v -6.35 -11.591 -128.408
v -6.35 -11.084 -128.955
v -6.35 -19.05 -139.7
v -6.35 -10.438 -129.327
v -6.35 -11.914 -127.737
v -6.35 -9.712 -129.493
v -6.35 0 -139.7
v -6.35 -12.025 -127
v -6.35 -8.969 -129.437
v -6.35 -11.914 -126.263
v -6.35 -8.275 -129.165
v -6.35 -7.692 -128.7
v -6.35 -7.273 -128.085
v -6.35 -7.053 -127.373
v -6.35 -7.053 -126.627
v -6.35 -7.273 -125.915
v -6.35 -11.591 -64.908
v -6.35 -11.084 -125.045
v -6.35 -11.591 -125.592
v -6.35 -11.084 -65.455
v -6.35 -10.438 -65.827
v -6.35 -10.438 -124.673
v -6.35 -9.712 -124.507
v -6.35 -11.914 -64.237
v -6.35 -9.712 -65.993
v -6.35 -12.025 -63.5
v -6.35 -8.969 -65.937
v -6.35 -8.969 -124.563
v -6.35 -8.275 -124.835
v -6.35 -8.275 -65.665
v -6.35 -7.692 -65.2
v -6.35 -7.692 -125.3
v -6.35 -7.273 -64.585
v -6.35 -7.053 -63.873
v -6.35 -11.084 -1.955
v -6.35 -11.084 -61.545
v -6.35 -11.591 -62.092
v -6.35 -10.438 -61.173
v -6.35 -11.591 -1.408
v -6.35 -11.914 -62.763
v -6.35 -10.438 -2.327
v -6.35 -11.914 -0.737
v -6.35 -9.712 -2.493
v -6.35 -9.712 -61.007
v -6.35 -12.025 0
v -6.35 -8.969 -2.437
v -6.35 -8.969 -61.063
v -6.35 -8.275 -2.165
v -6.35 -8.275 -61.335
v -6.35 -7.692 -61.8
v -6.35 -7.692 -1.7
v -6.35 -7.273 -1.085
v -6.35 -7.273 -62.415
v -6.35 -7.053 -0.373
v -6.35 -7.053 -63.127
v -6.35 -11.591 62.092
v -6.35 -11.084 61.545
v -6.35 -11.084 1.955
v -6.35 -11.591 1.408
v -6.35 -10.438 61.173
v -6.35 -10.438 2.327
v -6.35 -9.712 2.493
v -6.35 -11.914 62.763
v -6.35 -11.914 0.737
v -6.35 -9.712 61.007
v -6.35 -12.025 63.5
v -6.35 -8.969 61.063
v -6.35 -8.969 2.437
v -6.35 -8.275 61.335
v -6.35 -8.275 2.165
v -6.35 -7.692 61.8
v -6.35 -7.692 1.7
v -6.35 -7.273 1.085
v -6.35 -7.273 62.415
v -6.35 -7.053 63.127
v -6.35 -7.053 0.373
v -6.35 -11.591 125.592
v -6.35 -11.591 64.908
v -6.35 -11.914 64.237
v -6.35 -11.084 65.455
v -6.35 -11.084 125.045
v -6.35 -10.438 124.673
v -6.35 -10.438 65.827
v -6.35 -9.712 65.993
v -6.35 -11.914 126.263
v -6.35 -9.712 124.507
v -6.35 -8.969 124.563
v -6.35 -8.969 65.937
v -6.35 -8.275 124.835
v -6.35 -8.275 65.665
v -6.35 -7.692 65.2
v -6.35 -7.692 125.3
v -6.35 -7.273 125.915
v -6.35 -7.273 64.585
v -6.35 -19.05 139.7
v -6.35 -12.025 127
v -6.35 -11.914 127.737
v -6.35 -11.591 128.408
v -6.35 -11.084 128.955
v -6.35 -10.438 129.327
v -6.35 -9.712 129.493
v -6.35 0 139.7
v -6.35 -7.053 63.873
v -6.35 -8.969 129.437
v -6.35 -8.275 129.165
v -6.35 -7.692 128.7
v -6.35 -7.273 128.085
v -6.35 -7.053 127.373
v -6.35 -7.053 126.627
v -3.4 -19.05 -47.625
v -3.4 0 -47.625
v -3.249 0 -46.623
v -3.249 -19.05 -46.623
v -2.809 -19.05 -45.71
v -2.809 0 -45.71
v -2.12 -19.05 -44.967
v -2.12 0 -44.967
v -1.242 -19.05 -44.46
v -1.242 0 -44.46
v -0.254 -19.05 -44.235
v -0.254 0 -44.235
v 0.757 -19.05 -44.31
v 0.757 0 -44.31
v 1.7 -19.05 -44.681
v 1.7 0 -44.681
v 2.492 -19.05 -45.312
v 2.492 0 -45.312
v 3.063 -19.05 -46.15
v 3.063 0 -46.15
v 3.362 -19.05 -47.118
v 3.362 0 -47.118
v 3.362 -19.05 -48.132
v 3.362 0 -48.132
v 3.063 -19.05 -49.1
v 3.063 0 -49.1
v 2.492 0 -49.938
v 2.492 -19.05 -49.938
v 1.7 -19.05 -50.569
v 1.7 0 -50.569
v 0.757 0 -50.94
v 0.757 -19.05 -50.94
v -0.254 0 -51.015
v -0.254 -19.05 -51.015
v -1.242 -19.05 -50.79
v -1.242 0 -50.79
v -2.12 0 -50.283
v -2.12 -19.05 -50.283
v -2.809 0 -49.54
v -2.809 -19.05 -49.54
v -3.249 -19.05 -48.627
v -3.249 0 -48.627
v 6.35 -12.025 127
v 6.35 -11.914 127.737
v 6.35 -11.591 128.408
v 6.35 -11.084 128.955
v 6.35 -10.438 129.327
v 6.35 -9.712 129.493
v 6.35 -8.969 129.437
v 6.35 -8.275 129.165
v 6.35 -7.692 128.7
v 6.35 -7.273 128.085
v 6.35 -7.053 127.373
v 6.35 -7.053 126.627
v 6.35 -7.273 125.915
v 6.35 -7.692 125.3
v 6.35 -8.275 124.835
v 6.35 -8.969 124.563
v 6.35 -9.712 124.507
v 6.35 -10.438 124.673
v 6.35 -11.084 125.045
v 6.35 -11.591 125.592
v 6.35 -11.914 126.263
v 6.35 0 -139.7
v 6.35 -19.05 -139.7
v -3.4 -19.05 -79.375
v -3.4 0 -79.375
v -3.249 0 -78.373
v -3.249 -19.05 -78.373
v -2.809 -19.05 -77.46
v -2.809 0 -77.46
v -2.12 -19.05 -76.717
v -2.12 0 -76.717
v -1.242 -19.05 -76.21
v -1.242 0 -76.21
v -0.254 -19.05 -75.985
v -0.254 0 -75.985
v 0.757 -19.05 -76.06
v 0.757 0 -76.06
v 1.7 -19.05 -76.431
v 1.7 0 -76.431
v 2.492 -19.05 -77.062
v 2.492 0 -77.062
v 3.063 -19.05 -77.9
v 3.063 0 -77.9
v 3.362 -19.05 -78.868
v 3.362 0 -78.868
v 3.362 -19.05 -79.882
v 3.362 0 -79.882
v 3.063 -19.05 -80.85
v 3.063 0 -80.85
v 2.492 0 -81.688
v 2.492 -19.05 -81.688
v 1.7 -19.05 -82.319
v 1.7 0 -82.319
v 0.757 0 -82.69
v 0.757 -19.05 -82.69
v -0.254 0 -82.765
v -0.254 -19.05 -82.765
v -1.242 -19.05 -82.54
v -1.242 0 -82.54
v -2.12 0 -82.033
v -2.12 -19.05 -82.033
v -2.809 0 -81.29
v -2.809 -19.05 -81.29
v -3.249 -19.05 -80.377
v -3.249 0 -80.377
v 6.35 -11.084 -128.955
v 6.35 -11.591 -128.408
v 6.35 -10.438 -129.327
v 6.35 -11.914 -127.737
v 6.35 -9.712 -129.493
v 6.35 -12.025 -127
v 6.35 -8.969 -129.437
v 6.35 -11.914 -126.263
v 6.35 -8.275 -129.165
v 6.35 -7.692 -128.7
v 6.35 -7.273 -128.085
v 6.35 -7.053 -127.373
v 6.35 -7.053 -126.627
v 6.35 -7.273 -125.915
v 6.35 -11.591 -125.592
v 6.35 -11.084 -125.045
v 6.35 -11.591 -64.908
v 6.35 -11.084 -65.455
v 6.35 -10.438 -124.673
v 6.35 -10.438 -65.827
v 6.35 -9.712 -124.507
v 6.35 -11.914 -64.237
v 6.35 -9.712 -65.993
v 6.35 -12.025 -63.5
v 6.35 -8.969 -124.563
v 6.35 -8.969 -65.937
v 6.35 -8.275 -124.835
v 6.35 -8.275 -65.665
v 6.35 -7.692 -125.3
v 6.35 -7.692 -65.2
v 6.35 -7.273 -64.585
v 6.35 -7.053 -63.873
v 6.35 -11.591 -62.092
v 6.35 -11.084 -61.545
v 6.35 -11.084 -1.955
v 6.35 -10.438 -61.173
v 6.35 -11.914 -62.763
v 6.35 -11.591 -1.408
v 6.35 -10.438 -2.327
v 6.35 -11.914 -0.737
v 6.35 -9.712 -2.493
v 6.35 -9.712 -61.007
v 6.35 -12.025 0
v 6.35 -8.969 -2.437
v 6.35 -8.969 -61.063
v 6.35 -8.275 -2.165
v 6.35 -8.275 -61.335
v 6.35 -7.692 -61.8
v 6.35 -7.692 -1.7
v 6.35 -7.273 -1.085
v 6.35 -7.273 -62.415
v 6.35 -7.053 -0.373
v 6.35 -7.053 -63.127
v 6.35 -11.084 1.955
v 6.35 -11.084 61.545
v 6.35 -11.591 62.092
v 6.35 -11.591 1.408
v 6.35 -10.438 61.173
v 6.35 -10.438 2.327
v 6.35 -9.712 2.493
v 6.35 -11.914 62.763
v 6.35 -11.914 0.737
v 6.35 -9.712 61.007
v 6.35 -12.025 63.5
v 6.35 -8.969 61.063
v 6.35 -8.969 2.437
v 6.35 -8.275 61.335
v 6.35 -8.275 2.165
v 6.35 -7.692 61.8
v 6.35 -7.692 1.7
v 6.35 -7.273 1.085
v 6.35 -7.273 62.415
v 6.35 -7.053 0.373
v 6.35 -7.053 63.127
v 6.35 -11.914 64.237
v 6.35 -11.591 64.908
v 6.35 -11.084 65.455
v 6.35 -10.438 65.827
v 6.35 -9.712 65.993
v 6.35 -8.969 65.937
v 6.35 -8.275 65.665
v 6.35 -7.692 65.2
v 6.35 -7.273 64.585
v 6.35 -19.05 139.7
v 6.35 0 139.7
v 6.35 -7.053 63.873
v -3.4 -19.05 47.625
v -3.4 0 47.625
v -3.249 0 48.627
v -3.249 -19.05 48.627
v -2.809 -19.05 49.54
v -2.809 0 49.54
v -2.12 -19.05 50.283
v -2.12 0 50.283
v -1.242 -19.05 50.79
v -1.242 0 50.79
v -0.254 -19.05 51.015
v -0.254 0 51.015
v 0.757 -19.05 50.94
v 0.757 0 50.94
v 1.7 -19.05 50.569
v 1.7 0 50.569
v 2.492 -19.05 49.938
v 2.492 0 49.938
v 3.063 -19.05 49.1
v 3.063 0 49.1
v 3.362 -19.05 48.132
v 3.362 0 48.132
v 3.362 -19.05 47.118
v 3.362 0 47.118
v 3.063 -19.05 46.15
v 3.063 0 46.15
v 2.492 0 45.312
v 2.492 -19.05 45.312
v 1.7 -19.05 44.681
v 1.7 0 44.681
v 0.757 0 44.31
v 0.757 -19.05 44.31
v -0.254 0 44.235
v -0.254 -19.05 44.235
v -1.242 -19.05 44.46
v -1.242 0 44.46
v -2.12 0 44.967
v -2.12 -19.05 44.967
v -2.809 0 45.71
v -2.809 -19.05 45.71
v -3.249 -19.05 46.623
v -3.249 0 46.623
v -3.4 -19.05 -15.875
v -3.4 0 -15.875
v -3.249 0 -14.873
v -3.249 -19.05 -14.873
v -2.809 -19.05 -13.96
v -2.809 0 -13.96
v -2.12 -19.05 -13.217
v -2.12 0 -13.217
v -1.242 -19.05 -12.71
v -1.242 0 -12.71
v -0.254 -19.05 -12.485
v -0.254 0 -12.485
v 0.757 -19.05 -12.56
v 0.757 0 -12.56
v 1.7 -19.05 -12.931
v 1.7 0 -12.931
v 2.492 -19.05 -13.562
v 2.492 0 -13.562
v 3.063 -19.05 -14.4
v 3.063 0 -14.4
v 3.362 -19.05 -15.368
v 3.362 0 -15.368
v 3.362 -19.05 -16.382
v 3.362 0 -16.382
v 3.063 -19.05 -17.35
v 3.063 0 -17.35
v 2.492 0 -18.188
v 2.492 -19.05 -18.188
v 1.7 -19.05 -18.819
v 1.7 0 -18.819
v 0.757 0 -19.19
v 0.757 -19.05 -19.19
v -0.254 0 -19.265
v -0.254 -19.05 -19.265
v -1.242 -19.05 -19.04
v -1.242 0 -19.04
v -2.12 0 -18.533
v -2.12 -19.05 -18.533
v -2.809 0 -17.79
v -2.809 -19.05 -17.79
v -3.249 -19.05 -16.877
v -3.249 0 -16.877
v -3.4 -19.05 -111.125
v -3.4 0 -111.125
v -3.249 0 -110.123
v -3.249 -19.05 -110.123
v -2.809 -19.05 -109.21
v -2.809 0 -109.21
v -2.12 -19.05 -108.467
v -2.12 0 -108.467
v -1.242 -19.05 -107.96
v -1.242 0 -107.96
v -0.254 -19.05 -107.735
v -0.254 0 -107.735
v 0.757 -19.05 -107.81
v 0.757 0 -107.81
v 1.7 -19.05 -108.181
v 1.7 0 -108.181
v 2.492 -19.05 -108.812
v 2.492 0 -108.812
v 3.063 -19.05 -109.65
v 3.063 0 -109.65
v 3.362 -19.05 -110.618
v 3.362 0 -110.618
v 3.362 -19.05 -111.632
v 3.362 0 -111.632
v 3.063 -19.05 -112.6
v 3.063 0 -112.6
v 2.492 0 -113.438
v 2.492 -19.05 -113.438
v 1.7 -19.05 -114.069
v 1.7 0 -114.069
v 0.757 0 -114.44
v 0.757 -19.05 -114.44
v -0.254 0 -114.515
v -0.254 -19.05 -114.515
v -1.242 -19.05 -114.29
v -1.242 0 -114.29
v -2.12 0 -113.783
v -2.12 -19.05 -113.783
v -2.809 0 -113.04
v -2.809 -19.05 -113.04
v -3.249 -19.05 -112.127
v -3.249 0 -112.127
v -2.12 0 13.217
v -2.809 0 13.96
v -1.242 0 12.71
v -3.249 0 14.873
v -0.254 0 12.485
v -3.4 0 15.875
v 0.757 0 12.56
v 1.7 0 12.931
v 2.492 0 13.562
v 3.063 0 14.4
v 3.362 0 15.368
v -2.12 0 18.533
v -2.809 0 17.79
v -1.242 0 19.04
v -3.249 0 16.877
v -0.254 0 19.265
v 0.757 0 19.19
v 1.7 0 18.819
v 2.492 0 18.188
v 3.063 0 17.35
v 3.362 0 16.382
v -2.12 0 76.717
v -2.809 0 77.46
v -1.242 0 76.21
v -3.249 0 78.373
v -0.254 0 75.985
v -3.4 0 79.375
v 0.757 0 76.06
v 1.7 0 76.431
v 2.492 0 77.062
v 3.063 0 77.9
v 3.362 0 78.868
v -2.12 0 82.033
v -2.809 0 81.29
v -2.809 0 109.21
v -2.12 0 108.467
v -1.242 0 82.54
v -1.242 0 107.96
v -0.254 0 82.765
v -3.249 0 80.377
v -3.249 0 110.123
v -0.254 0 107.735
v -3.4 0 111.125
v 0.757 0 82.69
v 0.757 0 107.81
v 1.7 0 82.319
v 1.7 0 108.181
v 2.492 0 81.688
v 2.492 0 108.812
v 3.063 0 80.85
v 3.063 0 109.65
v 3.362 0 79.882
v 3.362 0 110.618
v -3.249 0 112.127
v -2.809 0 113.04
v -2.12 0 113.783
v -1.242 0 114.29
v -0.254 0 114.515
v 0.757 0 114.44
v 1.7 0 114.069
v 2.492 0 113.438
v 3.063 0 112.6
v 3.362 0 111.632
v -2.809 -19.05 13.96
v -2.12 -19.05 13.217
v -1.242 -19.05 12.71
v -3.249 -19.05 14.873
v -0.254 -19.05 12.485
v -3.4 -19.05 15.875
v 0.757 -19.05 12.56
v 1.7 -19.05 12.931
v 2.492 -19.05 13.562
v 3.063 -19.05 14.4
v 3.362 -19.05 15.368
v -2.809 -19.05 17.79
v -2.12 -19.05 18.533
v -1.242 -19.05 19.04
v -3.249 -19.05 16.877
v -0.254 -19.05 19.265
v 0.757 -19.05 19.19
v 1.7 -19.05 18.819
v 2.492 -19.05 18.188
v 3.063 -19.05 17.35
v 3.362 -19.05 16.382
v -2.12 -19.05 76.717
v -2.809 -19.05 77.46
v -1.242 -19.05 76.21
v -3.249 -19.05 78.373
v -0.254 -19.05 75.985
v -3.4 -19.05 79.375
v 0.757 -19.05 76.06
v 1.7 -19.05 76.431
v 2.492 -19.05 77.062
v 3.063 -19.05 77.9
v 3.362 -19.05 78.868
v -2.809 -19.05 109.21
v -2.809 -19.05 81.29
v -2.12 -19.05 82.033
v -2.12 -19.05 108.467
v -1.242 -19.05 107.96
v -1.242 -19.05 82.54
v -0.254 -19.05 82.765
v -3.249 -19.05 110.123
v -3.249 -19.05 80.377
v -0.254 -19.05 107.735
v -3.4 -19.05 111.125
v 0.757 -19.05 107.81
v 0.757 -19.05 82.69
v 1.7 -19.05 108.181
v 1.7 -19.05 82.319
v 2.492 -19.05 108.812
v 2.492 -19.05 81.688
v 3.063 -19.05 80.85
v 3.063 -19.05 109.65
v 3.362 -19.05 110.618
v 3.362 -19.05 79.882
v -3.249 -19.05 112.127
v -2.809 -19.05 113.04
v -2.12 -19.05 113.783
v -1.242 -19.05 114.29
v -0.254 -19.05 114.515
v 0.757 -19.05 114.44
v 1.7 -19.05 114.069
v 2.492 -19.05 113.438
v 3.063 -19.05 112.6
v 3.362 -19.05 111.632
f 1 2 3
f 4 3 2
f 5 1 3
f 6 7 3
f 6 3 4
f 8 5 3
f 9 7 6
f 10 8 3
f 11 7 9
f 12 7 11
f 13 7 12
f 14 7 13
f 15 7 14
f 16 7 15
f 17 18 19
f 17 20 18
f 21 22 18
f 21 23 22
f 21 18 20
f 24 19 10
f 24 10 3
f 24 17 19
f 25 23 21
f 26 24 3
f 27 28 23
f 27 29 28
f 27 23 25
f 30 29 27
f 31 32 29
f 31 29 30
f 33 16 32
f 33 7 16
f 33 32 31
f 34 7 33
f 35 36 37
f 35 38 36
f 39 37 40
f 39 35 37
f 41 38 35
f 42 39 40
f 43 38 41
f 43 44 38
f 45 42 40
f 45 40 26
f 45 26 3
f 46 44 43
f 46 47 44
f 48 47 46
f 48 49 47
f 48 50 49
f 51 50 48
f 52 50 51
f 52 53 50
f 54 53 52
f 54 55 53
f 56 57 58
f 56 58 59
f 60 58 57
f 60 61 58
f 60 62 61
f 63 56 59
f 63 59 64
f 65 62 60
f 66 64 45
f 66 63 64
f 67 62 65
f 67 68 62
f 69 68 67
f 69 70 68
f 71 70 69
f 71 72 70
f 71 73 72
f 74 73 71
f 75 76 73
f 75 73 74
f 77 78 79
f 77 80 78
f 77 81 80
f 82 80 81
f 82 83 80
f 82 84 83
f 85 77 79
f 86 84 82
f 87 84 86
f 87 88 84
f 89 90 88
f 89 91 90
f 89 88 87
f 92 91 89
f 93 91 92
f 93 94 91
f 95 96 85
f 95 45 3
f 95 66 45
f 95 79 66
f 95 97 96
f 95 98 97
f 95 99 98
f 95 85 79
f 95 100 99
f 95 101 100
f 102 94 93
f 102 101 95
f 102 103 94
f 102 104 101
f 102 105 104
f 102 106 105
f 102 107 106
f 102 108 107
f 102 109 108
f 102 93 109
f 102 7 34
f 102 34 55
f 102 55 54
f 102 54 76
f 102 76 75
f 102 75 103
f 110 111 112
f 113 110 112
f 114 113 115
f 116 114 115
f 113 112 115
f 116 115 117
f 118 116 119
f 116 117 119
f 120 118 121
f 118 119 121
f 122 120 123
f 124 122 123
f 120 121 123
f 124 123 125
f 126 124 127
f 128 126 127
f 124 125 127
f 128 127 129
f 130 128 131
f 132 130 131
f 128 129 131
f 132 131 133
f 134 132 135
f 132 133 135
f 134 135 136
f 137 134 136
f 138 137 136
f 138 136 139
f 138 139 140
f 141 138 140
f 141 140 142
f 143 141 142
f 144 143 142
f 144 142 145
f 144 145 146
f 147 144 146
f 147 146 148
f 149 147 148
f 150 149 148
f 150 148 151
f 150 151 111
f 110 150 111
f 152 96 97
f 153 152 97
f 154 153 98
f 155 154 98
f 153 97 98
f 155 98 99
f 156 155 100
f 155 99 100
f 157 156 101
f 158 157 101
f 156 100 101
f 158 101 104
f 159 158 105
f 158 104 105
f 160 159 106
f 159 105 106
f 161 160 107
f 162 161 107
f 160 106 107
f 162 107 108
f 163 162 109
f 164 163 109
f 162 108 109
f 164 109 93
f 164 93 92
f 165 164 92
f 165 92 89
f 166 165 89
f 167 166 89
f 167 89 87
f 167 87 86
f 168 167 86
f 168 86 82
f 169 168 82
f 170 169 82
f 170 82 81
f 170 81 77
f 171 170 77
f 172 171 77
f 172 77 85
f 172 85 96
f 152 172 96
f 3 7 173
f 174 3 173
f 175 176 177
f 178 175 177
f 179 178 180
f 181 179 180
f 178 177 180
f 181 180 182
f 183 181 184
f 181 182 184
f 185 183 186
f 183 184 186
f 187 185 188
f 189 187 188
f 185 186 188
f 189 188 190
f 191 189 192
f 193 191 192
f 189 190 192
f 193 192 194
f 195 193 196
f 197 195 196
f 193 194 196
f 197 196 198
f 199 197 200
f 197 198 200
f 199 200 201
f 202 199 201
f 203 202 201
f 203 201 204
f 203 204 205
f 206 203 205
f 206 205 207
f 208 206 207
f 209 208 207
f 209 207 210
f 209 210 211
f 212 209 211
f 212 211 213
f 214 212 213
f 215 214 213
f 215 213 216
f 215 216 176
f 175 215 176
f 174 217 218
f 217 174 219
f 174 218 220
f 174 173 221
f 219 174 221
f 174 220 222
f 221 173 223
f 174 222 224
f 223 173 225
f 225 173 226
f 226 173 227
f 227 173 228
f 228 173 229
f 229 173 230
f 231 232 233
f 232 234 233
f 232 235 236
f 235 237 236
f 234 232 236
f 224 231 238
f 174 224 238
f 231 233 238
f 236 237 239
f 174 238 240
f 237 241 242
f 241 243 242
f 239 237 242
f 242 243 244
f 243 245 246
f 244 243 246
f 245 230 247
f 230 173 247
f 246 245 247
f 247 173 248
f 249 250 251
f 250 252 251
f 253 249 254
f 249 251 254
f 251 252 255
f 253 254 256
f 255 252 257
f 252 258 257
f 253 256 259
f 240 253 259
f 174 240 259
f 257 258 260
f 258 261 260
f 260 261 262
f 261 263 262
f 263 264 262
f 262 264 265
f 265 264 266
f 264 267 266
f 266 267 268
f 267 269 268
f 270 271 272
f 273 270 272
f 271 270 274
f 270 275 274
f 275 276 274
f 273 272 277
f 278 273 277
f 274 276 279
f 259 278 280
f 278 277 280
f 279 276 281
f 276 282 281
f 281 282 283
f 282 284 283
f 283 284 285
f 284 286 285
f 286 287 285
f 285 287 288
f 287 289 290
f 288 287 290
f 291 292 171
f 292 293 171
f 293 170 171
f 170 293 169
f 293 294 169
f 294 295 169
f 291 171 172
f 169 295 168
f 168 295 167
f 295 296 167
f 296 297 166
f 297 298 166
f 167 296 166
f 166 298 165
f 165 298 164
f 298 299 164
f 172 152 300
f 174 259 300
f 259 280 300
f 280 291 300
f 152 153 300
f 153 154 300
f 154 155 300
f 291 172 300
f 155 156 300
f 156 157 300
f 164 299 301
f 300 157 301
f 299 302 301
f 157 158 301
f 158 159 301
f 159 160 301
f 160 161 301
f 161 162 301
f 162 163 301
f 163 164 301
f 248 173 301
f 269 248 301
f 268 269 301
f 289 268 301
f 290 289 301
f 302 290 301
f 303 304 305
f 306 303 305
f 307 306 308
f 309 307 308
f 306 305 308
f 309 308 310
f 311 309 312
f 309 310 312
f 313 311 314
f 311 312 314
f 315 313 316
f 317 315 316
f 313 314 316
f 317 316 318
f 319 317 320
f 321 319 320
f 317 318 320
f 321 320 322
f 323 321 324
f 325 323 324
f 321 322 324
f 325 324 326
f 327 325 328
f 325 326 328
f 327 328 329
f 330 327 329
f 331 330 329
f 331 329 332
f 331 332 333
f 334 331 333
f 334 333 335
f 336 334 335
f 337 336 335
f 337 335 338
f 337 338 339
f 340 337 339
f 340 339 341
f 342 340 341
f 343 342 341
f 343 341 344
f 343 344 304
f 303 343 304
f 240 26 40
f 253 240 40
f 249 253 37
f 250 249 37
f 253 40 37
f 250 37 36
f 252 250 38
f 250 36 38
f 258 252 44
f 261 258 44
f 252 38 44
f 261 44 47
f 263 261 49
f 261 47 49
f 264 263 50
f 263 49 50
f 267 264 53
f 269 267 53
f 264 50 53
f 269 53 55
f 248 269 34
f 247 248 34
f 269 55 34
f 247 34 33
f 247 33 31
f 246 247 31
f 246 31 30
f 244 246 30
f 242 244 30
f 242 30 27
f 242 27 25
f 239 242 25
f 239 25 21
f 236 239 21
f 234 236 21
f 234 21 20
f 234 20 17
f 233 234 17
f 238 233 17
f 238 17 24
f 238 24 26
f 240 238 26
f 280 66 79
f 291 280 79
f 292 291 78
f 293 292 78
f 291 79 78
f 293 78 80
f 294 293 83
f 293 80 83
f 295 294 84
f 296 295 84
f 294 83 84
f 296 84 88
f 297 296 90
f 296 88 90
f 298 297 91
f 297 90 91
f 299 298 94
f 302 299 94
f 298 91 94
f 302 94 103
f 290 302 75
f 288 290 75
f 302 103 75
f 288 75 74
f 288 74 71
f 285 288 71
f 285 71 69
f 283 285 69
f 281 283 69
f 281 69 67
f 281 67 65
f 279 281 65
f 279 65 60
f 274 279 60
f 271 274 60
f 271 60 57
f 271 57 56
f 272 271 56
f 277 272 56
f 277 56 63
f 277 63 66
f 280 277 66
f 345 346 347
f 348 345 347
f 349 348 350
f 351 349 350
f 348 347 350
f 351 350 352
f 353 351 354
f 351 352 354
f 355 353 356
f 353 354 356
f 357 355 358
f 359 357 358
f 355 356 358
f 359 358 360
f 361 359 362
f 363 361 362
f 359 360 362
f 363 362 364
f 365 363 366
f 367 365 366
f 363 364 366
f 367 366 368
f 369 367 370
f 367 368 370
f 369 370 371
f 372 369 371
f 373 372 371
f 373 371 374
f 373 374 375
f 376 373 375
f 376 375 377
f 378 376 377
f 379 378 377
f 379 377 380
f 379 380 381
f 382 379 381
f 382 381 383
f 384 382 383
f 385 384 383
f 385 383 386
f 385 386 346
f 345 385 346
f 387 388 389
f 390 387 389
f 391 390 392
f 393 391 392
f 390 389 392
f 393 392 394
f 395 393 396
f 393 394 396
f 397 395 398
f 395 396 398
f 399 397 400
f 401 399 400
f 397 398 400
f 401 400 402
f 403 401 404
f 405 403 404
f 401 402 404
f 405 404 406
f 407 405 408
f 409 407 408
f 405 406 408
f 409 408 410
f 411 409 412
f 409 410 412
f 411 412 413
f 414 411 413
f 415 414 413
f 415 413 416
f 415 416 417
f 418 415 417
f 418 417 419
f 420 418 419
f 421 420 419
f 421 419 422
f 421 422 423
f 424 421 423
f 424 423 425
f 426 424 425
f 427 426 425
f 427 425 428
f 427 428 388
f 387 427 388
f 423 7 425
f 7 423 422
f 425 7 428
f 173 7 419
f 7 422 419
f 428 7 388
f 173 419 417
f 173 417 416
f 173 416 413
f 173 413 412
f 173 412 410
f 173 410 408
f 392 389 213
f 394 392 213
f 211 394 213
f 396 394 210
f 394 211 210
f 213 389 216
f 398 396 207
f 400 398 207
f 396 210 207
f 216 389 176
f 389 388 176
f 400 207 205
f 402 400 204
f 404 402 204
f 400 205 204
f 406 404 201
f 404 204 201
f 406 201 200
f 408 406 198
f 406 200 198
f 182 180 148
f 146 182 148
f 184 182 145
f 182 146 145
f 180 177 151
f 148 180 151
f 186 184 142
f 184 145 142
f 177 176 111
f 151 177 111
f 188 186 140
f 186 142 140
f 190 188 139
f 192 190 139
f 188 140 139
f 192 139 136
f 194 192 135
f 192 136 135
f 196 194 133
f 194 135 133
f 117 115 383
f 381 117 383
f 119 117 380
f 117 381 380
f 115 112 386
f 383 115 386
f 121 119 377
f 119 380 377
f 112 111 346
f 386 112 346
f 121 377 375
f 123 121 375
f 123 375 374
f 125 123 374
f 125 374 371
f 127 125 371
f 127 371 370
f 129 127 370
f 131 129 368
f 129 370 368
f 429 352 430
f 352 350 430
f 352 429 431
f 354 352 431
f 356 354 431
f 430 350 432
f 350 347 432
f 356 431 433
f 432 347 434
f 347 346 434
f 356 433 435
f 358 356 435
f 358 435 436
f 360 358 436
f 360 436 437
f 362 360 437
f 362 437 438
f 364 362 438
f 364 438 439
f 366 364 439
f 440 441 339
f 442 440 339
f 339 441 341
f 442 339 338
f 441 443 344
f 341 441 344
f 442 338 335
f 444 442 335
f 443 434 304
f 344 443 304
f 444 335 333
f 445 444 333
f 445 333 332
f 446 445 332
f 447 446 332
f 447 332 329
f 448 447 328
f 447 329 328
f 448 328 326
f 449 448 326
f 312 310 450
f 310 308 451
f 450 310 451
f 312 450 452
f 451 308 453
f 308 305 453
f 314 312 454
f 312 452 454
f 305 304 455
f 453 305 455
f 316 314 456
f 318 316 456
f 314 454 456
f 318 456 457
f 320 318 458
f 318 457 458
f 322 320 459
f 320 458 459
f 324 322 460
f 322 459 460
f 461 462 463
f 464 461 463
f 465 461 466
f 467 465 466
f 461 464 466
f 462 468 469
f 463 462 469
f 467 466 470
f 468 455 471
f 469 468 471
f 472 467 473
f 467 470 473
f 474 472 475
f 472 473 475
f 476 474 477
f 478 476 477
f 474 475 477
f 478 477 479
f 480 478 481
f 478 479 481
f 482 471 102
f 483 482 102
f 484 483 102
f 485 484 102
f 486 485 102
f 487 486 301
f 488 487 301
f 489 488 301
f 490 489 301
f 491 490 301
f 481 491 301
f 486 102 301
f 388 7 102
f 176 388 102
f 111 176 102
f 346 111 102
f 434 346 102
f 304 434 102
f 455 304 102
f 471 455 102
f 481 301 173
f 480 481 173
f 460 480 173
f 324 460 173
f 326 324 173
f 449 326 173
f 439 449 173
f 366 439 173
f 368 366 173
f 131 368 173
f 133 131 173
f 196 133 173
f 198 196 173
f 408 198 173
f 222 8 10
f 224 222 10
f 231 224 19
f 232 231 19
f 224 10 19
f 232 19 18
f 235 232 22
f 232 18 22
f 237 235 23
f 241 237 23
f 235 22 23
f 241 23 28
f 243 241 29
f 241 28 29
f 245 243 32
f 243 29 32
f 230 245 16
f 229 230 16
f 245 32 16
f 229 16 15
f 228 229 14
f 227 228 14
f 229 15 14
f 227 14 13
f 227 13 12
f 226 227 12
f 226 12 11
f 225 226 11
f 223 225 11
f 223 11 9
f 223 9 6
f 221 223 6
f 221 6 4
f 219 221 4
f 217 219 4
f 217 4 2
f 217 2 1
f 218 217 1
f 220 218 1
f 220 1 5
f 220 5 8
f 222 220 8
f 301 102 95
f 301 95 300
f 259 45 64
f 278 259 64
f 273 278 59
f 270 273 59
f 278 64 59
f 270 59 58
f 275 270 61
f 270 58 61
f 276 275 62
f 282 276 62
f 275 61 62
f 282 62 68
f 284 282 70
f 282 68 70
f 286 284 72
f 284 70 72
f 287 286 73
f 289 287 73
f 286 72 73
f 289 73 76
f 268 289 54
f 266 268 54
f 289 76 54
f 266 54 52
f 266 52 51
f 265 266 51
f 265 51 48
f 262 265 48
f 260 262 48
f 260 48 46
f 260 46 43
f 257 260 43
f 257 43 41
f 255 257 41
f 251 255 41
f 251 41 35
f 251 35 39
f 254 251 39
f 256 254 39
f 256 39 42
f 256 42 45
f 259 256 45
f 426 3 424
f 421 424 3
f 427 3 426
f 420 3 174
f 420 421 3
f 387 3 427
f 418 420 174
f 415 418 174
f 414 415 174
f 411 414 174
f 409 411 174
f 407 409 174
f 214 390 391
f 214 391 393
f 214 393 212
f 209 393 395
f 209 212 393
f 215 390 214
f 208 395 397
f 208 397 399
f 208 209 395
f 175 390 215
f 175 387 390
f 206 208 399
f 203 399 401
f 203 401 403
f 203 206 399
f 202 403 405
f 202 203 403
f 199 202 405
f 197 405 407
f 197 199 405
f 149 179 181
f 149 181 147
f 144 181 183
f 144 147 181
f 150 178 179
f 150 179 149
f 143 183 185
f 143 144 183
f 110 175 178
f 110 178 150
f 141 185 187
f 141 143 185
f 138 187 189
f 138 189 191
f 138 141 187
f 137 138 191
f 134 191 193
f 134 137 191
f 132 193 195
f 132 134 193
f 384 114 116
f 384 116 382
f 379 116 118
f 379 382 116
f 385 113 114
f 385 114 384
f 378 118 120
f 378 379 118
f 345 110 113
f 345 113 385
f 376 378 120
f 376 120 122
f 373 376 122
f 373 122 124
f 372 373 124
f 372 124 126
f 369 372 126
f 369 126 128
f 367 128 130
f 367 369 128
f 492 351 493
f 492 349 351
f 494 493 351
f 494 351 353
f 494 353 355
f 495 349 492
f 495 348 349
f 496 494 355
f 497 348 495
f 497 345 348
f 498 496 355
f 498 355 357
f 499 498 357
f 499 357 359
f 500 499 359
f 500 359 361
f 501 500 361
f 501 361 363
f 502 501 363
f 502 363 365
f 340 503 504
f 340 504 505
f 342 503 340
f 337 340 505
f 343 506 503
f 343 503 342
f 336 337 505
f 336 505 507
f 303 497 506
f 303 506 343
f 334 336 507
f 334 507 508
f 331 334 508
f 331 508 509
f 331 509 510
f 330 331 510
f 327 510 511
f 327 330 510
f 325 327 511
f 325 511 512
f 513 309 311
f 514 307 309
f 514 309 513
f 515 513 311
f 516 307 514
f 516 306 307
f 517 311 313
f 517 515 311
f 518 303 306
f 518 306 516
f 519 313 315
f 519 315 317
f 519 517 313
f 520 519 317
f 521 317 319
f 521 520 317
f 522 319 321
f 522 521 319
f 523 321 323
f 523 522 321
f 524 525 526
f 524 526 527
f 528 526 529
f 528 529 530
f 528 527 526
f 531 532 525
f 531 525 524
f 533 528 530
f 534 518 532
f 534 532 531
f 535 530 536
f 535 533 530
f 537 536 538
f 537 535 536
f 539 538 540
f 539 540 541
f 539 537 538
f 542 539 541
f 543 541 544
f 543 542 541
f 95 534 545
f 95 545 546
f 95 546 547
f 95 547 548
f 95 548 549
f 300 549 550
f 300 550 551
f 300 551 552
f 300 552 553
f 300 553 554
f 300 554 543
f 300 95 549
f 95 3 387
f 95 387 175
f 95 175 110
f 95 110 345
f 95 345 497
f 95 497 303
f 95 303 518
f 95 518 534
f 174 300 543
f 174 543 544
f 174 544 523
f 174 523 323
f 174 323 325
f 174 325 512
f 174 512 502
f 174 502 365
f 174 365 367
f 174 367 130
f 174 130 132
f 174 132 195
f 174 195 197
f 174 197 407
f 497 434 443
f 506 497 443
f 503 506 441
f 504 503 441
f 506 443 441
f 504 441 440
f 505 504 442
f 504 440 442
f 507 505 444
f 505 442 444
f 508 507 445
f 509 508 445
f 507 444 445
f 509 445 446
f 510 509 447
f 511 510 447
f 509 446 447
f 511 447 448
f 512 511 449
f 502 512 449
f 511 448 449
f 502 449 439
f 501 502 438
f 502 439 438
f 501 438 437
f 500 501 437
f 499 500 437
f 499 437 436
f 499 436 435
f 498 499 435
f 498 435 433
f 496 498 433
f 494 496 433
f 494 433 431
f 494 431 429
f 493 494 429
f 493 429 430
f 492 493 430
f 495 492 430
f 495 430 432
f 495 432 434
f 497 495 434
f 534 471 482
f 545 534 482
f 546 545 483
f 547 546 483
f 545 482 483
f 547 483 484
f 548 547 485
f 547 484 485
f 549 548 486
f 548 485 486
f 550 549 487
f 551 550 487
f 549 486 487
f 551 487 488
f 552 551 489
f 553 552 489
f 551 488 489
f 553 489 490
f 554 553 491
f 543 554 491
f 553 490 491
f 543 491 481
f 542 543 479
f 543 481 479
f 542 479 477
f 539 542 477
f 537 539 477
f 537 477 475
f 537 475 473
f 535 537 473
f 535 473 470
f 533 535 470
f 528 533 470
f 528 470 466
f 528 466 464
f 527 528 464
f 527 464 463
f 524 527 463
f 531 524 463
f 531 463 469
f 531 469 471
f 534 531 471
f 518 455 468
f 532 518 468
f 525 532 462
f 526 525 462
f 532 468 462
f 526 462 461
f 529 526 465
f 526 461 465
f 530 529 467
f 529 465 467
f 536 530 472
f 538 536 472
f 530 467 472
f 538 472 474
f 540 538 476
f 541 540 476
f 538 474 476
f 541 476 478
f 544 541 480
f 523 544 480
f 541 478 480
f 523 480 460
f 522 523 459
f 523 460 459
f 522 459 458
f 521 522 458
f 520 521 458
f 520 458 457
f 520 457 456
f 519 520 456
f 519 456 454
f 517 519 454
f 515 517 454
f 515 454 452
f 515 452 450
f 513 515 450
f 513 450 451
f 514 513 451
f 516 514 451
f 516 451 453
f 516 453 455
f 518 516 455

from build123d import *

# Parameters (mm, degrees)
F0_W     = 12.7
F0_H     = 279.4
F1_DEPTH = 19.05
F3_D     = 5
F5_D     = 6.8


with BuildPart() as f1:
    # F0 (on Front) → F1 (new body)
    with BuildSketch(Plane.XZ):
        Rectangle(F0_W, F0_H)
    extrude(amount=F1_DEPTH)

    # F3 (through all)
    with Locations(Plane.YZ.offset(6.35)):
        with Locations((-9.525, 127), (-9.525, 63.5), (-9.525, 0), (-9.525, -63.5), (-9.525, -127)):
            Hole(F3_D / 2)

    # F5 (through all)
    with Locations(Plane.XZ.offset(19.05)):
        with Locations((0, 111.125), (0, 79.375), (0, 47.625), (0, 15.875), (0, -15.875), (0, -47.625), (0, -79.375), (0, -111.125)):
            Hole(F5_D / 2)


solid = f1.part
